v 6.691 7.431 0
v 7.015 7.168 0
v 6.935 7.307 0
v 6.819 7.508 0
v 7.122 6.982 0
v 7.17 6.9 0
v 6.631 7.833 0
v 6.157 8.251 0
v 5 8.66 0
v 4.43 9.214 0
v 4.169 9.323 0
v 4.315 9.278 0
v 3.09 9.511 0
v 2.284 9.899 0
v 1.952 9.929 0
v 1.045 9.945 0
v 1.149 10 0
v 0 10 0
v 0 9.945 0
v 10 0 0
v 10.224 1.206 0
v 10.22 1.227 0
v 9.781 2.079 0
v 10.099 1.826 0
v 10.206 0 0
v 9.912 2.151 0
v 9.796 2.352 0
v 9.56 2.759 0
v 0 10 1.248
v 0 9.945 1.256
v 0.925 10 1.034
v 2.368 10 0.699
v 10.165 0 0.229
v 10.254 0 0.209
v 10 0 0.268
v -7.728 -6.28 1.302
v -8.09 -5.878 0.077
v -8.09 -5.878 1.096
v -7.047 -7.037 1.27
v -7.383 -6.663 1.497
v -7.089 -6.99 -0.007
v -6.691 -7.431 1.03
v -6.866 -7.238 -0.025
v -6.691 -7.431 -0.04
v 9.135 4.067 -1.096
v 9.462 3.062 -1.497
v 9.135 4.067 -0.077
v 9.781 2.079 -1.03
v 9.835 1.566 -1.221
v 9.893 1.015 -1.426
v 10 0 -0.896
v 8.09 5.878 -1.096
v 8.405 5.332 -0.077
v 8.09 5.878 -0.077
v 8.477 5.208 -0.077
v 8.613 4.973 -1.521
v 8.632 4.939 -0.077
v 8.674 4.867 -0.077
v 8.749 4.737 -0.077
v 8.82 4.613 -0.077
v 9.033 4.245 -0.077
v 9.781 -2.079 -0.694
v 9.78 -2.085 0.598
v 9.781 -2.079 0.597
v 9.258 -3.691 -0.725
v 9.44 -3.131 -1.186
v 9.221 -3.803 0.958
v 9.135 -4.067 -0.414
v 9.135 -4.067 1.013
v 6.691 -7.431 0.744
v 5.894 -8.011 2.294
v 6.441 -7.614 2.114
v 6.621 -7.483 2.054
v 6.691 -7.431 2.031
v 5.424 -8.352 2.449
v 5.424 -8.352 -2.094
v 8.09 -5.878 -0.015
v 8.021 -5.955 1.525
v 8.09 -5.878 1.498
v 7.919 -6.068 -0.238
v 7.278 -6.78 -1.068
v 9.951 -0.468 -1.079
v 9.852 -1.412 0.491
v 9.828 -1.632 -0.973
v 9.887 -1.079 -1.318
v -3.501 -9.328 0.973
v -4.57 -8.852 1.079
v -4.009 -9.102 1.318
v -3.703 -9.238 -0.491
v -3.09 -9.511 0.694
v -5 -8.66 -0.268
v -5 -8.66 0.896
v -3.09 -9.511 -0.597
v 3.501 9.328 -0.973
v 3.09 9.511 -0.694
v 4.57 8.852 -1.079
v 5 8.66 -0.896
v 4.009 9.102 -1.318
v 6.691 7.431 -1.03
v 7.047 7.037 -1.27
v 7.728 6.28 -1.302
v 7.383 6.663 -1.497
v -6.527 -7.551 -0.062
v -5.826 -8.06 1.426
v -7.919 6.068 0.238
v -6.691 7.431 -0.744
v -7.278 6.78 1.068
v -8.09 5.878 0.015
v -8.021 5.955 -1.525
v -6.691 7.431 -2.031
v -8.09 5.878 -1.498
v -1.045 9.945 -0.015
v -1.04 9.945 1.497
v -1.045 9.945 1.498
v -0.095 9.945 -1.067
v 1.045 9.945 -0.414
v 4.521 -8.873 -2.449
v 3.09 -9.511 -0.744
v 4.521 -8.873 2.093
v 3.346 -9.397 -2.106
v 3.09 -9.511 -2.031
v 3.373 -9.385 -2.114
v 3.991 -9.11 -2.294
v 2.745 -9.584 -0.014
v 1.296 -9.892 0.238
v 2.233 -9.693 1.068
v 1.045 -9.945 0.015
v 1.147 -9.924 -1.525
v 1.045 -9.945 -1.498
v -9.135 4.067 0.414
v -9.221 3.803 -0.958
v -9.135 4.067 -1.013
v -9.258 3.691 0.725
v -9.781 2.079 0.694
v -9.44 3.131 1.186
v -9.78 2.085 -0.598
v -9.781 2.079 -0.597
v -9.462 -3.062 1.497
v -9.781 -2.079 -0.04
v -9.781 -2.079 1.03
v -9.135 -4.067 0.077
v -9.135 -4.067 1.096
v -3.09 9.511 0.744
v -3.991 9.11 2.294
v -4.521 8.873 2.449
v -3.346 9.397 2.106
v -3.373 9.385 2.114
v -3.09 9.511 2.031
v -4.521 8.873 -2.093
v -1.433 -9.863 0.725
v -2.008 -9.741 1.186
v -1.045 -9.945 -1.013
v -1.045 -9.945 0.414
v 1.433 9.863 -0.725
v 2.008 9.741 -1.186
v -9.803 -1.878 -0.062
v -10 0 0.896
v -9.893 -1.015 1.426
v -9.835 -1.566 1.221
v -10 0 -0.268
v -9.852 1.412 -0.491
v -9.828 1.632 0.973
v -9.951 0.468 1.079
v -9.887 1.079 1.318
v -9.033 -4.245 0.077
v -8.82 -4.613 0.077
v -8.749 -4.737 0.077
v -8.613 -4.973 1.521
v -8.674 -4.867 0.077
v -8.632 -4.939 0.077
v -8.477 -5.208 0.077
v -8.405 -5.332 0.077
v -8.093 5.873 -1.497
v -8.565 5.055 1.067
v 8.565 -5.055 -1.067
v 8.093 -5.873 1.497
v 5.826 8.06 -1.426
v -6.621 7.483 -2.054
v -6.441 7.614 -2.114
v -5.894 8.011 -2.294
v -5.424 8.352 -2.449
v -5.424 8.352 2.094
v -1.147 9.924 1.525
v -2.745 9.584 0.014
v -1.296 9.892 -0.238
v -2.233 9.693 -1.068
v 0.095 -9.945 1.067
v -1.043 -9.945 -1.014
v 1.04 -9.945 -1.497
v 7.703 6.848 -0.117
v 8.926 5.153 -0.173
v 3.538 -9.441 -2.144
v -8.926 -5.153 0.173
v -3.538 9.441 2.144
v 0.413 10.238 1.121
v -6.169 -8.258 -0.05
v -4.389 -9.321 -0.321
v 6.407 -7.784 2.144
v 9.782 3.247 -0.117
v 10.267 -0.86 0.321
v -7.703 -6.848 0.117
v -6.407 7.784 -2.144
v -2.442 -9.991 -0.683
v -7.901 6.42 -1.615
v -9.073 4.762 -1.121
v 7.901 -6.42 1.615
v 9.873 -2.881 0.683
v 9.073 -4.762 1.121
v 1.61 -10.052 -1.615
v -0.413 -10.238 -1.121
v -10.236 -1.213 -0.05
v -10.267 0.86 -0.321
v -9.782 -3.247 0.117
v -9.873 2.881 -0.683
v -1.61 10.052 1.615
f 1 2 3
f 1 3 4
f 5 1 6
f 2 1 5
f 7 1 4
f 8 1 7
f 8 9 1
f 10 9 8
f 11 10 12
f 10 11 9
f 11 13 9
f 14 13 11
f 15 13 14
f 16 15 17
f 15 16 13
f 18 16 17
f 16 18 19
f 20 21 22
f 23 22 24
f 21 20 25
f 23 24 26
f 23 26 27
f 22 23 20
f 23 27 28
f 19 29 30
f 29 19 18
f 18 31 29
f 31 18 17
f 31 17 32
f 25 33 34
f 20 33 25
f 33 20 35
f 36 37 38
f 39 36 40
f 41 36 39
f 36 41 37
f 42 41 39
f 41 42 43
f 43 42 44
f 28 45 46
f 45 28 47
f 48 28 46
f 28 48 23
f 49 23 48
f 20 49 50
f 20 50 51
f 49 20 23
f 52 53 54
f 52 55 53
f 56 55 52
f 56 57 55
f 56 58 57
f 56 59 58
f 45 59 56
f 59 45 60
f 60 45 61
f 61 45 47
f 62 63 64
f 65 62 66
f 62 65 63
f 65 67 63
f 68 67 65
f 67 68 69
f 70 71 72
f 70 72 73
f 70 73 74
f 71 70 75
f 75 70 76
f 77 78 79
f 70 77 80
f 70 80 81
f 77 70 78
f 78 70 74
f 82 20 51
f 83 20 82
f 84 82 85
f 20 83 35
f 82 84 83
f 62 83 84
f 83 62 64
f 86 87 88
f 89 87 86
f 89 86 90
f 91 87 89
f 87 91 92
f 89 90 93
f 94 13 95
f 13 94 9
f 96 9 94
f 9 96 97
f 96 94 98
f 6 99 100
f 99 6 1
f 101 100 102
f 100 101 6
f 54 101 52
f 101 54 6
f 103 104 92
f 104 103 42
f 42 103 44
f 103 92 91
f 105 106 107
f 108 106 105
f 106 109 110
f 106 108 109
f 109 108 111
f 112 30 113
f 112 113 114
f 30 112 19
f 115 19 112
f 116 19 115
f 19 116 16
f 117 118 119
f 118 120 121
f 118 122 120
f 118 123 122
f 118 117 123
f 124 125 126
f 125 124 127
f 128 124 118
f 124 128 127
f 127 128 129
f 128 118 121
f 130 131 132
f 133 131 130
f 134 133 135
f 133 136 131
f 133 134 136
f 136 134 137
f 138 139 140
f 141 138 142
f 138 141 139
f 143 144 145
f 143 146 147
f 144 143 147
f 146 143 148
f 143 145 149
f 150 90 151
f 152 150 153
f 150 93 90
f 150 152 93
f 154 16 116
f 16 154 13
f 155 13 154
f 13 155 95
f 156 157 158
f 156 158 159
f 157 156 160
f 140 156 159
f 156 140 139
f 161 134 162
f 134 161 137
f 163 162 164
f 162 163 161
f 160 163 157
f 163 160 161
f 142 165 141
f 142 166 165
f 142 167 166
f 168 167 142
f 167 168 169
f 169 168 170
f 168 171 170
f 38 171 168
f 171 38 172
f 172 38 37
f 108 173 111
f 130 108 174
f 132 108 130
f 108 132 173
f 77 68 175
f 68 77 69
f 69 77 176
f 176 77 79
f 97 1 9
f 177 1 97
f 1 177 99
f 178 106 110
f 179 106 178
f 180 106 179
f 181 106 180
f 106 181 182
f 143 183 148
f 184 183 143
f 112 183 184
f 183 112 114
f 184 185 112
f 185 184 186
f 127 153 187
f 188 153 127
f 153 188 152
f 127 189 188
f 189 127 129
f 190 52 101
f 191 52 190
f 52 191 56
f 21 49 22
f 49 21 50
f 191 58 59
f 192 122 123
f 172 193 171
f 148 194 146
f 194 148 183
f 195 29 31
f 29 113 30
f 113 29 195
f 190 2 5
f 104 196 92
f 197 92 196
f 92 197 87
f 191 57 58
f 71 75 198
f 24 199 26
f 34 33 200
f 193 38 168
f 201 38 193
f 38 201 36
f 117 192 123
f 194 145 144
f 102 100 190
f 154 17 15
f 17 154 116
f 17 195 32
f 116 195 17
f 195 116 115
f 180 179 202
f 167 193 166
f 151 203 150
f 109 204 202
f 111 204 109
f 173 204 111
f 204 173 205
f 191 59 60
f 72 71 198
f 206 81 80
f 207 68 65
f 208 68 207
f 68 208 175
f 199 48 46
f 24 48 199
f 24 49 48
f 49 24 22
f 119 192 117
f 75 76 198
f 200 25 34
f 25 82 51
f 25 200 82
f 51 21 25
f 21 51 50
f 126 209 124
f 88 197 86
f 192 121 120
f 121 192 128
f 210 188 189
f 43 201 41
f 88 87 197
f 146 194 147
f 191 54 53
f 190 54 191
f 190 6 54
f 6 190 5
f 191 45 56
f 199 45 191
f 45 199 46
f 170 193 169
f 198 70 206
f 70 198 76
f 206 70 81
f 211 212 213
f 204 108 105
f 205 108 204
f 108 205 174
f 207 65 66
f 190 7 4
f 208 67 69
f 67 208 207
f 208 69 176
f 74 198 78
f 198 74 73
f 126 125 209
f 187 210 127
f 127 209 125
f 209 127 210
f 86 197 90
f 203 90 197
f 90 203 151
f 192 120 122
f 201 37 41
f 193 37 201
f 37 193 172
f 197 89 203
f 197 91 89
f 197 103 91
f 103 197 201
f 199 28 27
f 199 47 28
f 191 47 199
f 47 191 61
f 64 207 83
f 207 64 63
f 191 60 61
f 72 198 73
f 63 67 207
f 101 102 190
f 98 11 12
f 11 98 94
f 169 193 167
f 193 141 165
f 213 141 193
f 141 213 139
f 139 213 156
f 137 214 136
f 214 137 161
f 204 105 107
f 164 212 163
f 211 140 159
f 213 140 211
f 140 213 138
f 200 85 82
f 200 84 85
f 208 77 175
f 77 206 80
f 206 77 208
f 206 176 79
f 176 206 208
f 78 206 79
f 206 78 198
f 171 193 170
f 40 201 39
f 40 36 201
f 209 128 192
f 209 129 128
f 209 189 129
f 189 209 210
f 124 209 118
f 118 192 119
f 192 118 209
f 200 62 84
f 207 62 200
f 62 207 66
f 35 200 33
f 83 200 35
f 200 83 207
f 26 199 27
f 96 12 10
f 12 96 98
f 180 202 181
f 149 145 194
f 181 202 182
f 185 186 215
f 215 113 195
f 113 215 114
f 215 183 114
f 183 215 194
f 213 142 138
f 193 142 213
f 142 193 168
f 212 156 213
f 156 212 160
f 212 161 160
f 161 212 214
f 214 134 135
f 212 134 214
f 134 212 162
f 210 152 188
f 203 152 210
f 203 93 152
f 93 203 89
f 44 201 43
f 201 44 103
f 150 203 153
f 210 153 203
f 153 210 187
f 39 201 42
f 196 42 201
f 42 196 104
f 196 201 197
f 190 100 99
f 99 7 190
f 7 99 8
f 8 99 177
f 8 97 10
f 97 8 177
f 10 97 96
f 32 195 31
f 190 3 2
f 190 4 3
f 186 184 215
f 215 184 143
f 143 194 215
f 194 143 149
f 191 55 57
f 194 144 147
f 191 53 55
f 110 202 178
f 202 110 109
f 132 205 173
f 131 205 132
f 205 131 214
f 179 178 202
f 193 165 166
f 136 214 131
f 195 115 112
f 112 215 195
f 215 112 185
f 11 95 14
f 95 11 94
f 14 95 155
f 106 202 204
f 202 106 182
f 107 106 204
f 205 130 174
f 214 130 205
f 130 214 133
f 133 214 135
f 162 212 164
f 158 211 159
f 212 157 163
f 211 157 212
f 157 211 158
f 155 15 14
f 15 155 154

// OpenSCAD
// Generated by generate_scads.py
difference() {
  rotate([180,15,30]) {
    cylinder(h=5, r=10, center=true);
  }
  intersection() {
    cylinder(h=30, r=12, center=false);
    cube(size=[15,10,25], center=false);
  }
  union() {
    sphere(r=2);
  }
  union() {
    cylinder(h=10, r=2, center=true);
    cylinder(h=30, r=10, center=true);
  }
}
